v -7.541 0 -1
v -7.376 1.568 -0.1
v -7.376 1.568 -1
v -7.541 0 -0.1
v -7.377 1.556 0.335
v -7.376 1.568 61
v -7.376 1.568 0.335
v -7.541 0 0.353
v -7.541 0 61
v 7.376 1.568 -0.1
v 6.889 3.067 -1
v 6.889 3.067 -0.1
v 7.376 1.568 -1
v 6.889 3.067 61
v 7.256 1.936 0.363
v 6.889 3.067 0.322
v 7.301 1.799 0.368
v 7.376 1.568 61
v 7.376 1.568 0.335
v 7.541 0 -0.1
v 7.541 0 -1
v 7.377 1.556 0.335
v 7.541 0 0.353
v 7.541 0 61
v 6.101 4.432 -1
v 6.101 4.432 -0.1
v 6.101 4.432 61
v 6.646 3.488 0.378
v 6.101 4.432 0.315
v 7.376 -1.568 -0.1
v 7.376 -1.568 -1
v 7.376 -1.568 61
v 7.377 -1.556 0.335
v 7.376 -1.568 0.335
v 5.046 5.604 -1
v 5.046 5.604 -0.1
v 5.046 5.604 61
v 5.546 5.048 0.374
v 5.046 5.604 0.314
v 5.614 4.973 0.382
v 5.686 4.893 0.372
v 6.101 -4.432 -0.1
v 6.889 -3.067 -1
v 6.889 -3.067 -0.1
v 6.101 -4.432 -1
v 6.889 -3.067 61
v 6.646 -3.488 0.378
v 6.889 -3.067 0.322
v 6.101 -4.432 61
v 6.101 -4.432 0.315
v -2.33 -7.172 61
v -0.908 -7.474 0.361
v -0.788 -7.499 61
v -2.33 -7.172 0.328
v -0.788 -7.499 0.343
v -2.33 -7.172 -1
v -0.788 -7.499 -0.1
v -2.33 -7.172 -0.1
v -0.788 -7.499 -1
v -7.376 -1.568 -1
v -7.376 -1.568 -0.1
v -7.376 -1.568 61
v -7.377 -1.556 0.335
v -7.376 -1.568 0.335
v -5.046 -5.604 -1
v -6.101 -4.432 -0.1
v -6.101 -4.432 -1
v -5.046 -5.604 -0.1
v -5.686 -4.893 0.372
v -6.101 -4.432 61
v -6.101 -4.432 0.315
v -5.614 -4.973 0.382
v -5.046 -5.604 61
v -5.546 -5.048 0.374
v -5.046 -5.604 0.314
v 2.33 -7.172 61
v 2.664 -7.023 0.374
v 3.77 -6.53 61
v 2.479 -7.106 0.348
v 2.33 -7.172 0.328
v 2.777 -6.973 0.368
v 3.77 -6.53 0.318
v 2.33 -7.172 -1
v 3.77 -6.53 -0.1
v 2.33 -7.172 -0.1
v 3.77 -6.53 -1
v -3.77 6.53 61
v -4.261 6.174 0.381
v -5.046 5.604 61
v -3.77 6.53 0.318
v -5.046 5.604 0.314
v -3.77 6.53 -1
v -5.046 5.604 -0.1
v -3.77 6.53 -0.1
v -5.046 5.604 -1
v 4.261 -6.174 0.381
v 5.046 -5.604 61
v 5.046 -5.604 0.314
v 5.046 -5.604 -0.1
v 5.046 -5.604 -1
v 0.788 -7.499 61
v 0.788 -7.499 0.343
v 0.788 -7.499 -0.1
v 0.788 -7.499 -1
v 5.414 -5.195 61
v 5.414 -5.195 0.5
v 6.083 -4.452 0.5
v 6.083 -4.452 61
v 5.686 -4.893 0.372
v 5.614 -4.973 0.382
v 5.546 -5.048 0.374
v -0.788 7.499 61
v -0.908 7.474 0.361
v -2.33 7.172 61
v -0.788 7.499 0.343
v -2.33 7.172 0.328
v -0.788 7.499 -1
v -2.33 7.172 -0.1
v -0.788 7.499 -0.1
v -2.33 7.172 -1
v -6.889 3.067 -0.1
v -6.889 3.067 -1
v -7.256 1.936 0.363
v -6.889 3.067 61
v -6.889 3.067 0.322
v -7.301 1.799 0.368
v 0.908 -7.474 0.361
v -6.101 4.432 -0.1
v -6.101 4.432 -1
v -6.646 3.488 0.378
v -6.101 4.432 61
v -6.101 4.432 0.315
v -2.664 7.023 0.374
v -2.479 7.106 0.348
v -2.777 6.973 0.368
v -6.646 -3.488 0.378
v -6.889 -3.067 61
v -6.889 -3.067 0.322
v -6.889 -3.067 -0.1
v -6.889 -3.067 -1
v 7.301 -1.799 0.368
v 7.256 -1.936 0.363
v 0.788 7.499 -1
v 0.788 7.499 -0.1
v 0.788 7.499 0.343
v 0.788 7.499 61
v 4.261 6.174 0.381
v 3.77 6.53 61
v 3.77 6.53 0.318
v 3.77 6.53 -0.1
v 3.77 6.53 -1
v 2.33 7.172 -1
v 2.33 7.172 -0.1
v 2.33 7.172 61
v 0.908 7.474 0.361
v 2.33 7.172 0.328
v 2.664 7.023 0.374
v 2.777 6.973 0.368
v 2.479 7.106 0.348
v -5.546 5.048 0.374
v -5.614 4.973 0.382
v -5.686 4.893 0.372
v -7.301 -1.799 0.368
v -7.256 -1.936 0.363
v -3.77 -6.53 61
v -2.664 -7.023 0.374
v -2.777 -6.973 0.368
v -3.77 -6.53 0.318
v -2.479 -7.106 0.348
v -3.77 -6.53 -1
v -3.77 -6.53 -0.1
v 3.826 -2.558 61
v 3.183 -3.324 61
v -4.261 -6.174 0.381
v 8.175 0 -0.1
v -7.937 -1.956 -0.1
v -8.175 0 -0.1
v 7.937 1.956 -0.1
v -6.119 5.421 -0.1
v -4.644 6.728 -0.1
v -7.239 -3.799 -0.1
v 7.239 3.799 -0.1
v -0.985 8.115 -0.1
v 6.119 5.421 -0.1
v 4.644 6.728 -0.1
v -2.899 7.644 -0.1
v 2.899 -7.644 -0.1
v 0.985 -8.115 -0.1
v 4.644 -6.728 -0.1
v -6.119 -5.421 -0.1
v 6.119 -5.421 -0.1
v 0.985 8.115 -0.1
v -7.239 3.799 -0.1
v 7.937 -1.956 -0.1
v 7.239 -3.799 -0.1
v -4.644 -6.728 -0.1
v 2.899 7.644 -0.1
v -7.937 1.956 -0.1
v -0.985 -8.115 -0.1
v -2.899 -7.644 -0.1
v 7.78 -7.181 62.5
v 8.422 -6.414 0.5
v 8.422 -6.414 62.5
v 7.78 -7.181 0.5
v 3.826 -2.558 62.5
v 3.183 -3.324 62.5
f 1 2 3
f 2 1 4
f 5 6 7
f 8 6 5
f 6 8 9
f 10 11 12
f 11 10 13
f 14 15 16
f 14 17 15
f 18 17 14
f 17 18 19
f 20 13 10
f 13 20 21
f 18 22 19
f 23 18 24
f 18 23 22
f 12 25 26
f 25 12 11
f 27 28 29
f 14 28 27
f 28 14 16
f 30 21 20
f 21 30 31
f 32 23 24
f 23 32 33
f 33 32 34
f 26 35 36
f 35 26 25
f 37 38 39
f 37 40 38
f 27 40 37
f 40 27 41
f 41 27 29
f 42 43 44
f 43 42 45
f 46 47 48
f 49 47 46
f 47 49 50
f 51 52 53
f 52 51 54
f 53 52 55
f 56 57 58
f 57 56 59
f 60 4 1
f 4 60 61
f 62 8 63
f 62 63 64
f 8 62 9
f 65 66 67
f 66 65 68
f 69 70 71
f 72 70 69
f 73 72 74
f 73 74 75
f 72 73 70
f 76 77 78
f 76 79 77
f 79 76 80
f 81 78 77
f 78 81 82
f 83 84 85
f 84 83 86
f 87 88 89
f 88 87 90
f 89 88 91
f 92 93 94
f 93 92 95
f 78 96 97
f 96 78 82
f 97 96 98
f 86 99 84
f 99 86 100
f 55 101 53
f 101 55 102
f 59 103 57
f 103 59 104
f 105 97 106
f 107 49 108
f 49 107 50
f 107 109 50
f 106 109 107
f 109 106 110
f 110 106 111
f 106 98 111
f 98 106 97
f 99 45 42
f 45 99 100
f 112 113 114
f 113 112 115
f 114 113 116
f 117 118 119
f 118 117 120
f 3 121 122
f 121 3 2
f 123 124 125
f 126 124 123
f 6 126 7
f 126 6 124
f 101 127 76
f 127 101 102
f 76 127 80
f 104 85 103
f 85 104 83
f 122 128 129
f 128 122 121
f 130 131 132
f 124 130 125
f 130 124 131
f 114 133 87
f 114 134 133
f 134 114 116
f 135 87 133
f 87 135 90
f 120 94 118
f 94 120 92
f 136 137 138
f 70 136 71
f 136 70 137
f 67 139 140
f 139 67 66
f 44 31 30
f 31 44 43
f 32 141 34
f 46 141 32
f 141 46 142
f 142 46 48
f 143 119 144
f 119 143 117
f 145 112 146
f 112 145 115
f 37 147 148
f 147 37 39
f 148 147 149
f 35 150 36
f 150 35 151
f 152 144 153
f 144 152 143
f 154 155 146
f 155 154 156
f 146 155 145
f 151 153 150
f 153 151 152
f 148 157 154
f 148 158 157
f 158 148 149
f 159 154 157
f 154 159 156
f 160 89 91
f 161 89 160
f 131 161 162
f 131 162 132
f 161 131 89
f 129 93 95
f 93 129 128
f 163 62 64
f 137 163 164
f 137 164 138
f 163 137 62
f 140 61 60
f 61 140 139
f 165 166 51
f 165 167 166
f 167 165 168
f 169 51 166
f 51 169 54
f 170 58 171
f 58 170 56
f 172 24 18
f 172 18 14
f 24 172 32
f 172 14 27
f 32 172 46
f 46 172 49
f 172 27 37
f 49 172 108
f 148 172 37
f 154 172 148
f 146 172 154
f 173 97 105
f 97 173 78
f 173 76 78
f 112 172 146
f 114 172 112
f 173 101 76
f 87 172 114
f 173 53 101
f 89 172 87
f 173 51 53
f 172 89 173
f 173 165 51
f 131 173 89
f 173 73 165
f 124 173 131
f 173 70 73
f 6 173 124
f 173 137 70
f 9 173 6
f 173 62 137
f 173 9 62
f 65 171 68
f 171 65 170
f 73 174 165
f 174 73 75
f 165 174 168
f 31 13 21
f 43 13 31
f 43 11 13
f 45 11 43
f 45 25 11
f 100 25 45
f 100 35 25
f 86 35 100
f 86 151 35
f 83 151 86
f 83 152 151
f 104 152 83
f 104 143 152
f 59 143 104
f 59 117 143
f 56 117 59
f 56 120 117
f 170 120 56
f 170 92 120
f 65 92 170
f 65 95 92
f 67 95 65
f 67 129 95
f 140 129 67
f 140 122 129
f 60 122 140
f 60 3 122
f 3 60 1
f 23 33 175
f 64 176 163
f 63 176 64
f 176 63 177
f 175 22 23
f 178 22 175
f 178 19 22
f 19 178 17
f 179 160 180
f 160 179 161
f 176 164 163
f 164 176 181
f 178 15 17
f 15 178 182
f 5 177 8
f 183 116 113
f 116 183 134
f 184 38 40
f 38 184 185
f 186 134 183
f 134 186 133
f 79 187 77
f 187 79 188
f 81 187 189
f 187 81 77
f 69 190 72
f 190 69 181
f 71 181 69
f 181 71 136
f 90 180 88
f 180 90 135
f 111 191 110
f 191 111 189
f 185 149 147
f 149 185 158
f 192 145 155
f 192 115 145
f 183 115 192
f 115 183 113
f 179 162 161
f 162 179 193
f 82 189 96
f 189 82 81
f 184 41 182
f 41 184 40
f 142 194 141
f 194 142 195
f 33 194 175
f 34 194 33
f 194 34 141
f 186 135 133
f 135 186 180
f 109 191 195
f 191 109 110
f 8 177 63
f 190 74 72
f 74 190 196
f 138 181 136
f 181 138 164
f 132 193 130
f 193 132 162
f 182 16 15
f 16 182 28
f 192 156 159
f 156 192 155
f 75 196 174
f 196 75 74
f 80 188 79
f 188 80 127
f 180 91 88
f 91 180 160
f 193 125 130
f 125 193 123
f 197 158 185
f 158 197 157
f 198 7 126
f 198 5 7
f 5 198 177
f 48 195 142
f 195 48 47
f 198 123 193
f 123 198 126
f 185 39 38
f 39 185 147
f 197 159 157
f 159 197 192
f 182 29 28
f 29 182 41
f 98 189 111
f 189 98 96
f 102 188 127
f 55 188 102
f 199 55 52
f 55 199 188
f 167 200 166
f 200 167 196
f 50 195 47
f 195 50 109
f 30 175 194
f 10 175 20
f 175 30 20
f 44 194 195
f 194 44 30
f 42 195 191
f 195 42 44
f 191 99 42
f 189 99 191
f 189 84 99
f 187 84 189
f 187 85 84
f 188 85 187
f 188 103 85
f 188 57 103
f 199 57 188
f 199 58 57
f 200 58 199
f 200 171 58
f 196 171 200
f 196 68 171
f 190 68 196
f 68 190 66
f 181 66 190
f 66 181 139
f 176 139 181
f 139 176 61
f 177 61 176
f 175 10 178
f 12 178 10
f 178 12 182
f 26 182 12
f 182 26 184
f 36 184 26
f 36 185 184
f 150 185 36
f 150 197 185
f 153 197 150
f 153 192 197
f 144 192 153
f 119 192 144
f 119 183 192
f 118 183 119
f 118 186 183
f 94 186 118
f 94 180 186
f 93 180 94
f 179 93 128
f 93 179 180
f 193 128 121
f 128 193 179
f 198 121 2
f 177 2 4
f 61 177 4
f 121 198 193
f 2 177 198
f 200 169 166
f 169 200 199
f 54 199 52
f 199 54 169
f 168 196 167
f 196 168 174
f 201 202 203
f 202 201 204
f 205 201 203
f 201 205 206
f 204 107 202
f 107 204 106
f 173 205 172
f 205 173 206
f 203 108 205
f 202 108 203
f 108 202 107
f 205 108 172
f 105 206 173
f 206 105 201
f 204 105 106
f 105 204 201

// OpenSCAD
// file: polyholes.scad
//
// Mendel90
//
// GNU GPL v2
// nop.head@gmail.com
// hydraraptor.blogspot.com
//
// See http://hydraraptor.blogspot.com/2011/02/polyholes.html
//
function sides(r) = max(round(4 * r), 3);
function correctedRadius(r, n) = 0.1 + r / cos(180 / n);
function correctedDiameter(d) = 0.2 + d / cos(180 / sides(d / 2));

module polyCircle(r, center = false) {
  n = sides(r);
  circle(r=correctedRadius(r, n), $fn=n, center=center);
}

module poly_circle(r, center = false) {
  polyCircle(r, center);
}

module polyCylinder(r, h, center = false) {
  n = sides(r);
  cylinder(h=h, r=correctedRadius(r, n), $fn=n, center=center);
}

module poly_cylinder(r, h, center = false) {
  polyCylinder(r, h, center);
}

module polydCylinder(r, center = false) {
  n = sides(r);
  r = correctedRadius(r, n);
  cylinder(h=h, r=r, $fn=n, center=center);
  translate([0, -r, 0])
    cube([r, 2 * r, h]);
}

module poly_d_cylinder(r, center = false) {
  polydCylinder(r, center);
}
// main file
// PRUSA iteration3
// Bearing holders
// GNU GPL v3
// Josef Průša <iam@josefprusa.cz> and contributors
// http://www.reprap.org/wiki/Prusa_Mendel
// http://prusamendel.org

use <polyholes.scad>

bearing_diameter = 14.95;

module horizontal_bearing_base(bearings = 1) {
  translate(v=[0, 0, 6]) cube(size=[24, 8 + bearings * 25, 12], center=true);
}

module horizontal_bearing_holes(bearings = 1) {
  cutter_lenght = 10 + bearings * 25;
  one_holder_lenght = 8 + 25;
  holder_lenght = 8 + bearings * 25;

  // Main bearing cut
  difference() {
    translate(v=[0, 0, 12]) rotate(a=[90, 0, 0]) translate(v=[0, 0, -cutter_lenght / 2]) cylinder(h=cutter_lenght, r=(bearing_diameter / 2) + 0.2, $fn=50);
    // Bearing retainers
    translate(v=[0, 1 - holder_lenght / 2, 3]) cube(size=[24, 6, 8], center=true);
    translate(v=[0, -1 + holder_lenght / 2, 3]) cube(size=[24, 6, 8], center=true);
  }

  // Ziptie cutouts
  ziptie_cut_ofset = 0;
  for (i = [0:bearings - 1]) {
    // For easier positioning I move them by half of one 
    // bearing holder then add each bearign lenght and then center again
    translate(v=[0, -holder_lenght / 2, 0]) translate(v=[0, one_holder_lenght / 2 + i * 25, 0]) difference() {
          union() {
            translate(v=[0, 2 - 8.5, 12]) rotate(a=[90, 0, 0]) translate(v=[0, 0, 0]) cylinder(h=4, r=11.5, $fn=50);
            translate(v=[0, 2 + 8.5, 12]) rotate(a=[90, 0, 0]) translate(v=[0, 0, 0]) cylinder(h=4, r=11.5, $fn=50);
          }
          translate(v=[0, 12, 12]) rotate(a=[90, 0, 0]) translate(v=[0, 0, 0]) cylinder(h=24, r=9, $fn=50);
        }
  }
}

module horizontal_bearing_holes_nozip(bearings = 1) {
  cutter_lenght = 10 + bearings * 25;
  one_holder_lenght = 8 + 25;
  holder_lenght = 8 + bearings * 25;

  // Main bearing cut
  difference() {
    translate(v=[0, 0, 12]) rotate(a=[90, 0, 0]) translate(v=[0, 0, -cutter_lenght / 2]) cylinder(h=cutter_lenght, r=(bearing_diameter / 2) + 0.2, $fn=50);
    // Bearing retainers
    translate(v=[0, 1 - holder_lenght / 2, 3]) cube(size=[24, 6, 8], center=true);
    translate(v=[0, -1 + holder_lenght / 2, 3]) cube(size=[24, 6, 8], center=true);
  }
}

module horizontal_bearing_holes_nozip_smooth(bearings = 1) {
  cutter_lenght = 10 + bearings * 25;
  one_holder_lenght = 8 + 25;
  holder_lenght = 8 + bearings * 25;

  // Main bearing cut
  difference() {
    translate(v=[0, 0, 12]) rotate(a=[90, 0, 0]) translate(v=[0, 0, -cutter_lenght / 2]) cylinder(h=cutter_lenght, r=(bearing_diameter / 2) + 0.2, $fn=150);
    // Bearing retainers
    translate(v=[0, 1 - holder_lenght / 2, 3]) cube(size=[24, 6, 8], center=true);
    translate(v=[0, -1 + holder_lenght / 2, 3]) cube(size=[24, 6, 8], center=true);
  }
}

module horizontal_bearing_holes_smooth_nozip(bearings = 1) {
  cutter_lenght = 10 + bearings * 25;
  one_holder_lenght = 8 + 25;
  holder_lenght = 8 + bearings * 25;

  // Main bearing cut
  difference() {
    translate(v=[0, 0, 12]) rotate(a=[90, 0, 0]) translate(v=[0, 0, -cutter_lenght / 2]) cylinder(h=cutter_lenght, r=(bearing_diameter / 2) + 0.2, $fn=120);
    // Bearing retainers
    translate(v=[0, 1 - holder_lenght / 2, 3]) cube(size=[24, 6, 8], center=true);
    translate(v=[0, -1 + holder_lenght / 2, 3]) cube(size=[24, 6, 8], center=true);
  }
}

thinwall = 3;
bearing_size = bearing_diameter + 2 * thinwall;

module vertical_bearing_base() {
  translate(v=[-2 - bearing_size / 4, 0, 29]) cube(size=[4 + bearing_size / 2, bearing_size, 58], center=true);
  cylinder(h=58, r=bearing_size / 2, $fn=250);
}

module vertical_bearing_holes() {
  translate(v=[0, 0, -1]) poly_cylinder(h=62, r=(14.80 / 2));
  translate(v=[0, 0, -0.1]) cylinder(r1=(bearing_diameter / 2) + 0.7, r2=(bearing_diameter / 2), h=0.5);
  rotate(a=[0, 0, -40]) translate(v=[bearing_diameter / 2 - 2.9, -0.5, 0.5]) cube(size=[thinwall * 2, 1, 62]);
}

//difference(){
//vertical_bearing_base();
vertical_bearing_holes();
//}
//horizontal_bearing_test();
//horizontal_bearing_base(1);
//horizontal_bearing_holes(1);
//horizontal_bearing_holes_nozip(1);
